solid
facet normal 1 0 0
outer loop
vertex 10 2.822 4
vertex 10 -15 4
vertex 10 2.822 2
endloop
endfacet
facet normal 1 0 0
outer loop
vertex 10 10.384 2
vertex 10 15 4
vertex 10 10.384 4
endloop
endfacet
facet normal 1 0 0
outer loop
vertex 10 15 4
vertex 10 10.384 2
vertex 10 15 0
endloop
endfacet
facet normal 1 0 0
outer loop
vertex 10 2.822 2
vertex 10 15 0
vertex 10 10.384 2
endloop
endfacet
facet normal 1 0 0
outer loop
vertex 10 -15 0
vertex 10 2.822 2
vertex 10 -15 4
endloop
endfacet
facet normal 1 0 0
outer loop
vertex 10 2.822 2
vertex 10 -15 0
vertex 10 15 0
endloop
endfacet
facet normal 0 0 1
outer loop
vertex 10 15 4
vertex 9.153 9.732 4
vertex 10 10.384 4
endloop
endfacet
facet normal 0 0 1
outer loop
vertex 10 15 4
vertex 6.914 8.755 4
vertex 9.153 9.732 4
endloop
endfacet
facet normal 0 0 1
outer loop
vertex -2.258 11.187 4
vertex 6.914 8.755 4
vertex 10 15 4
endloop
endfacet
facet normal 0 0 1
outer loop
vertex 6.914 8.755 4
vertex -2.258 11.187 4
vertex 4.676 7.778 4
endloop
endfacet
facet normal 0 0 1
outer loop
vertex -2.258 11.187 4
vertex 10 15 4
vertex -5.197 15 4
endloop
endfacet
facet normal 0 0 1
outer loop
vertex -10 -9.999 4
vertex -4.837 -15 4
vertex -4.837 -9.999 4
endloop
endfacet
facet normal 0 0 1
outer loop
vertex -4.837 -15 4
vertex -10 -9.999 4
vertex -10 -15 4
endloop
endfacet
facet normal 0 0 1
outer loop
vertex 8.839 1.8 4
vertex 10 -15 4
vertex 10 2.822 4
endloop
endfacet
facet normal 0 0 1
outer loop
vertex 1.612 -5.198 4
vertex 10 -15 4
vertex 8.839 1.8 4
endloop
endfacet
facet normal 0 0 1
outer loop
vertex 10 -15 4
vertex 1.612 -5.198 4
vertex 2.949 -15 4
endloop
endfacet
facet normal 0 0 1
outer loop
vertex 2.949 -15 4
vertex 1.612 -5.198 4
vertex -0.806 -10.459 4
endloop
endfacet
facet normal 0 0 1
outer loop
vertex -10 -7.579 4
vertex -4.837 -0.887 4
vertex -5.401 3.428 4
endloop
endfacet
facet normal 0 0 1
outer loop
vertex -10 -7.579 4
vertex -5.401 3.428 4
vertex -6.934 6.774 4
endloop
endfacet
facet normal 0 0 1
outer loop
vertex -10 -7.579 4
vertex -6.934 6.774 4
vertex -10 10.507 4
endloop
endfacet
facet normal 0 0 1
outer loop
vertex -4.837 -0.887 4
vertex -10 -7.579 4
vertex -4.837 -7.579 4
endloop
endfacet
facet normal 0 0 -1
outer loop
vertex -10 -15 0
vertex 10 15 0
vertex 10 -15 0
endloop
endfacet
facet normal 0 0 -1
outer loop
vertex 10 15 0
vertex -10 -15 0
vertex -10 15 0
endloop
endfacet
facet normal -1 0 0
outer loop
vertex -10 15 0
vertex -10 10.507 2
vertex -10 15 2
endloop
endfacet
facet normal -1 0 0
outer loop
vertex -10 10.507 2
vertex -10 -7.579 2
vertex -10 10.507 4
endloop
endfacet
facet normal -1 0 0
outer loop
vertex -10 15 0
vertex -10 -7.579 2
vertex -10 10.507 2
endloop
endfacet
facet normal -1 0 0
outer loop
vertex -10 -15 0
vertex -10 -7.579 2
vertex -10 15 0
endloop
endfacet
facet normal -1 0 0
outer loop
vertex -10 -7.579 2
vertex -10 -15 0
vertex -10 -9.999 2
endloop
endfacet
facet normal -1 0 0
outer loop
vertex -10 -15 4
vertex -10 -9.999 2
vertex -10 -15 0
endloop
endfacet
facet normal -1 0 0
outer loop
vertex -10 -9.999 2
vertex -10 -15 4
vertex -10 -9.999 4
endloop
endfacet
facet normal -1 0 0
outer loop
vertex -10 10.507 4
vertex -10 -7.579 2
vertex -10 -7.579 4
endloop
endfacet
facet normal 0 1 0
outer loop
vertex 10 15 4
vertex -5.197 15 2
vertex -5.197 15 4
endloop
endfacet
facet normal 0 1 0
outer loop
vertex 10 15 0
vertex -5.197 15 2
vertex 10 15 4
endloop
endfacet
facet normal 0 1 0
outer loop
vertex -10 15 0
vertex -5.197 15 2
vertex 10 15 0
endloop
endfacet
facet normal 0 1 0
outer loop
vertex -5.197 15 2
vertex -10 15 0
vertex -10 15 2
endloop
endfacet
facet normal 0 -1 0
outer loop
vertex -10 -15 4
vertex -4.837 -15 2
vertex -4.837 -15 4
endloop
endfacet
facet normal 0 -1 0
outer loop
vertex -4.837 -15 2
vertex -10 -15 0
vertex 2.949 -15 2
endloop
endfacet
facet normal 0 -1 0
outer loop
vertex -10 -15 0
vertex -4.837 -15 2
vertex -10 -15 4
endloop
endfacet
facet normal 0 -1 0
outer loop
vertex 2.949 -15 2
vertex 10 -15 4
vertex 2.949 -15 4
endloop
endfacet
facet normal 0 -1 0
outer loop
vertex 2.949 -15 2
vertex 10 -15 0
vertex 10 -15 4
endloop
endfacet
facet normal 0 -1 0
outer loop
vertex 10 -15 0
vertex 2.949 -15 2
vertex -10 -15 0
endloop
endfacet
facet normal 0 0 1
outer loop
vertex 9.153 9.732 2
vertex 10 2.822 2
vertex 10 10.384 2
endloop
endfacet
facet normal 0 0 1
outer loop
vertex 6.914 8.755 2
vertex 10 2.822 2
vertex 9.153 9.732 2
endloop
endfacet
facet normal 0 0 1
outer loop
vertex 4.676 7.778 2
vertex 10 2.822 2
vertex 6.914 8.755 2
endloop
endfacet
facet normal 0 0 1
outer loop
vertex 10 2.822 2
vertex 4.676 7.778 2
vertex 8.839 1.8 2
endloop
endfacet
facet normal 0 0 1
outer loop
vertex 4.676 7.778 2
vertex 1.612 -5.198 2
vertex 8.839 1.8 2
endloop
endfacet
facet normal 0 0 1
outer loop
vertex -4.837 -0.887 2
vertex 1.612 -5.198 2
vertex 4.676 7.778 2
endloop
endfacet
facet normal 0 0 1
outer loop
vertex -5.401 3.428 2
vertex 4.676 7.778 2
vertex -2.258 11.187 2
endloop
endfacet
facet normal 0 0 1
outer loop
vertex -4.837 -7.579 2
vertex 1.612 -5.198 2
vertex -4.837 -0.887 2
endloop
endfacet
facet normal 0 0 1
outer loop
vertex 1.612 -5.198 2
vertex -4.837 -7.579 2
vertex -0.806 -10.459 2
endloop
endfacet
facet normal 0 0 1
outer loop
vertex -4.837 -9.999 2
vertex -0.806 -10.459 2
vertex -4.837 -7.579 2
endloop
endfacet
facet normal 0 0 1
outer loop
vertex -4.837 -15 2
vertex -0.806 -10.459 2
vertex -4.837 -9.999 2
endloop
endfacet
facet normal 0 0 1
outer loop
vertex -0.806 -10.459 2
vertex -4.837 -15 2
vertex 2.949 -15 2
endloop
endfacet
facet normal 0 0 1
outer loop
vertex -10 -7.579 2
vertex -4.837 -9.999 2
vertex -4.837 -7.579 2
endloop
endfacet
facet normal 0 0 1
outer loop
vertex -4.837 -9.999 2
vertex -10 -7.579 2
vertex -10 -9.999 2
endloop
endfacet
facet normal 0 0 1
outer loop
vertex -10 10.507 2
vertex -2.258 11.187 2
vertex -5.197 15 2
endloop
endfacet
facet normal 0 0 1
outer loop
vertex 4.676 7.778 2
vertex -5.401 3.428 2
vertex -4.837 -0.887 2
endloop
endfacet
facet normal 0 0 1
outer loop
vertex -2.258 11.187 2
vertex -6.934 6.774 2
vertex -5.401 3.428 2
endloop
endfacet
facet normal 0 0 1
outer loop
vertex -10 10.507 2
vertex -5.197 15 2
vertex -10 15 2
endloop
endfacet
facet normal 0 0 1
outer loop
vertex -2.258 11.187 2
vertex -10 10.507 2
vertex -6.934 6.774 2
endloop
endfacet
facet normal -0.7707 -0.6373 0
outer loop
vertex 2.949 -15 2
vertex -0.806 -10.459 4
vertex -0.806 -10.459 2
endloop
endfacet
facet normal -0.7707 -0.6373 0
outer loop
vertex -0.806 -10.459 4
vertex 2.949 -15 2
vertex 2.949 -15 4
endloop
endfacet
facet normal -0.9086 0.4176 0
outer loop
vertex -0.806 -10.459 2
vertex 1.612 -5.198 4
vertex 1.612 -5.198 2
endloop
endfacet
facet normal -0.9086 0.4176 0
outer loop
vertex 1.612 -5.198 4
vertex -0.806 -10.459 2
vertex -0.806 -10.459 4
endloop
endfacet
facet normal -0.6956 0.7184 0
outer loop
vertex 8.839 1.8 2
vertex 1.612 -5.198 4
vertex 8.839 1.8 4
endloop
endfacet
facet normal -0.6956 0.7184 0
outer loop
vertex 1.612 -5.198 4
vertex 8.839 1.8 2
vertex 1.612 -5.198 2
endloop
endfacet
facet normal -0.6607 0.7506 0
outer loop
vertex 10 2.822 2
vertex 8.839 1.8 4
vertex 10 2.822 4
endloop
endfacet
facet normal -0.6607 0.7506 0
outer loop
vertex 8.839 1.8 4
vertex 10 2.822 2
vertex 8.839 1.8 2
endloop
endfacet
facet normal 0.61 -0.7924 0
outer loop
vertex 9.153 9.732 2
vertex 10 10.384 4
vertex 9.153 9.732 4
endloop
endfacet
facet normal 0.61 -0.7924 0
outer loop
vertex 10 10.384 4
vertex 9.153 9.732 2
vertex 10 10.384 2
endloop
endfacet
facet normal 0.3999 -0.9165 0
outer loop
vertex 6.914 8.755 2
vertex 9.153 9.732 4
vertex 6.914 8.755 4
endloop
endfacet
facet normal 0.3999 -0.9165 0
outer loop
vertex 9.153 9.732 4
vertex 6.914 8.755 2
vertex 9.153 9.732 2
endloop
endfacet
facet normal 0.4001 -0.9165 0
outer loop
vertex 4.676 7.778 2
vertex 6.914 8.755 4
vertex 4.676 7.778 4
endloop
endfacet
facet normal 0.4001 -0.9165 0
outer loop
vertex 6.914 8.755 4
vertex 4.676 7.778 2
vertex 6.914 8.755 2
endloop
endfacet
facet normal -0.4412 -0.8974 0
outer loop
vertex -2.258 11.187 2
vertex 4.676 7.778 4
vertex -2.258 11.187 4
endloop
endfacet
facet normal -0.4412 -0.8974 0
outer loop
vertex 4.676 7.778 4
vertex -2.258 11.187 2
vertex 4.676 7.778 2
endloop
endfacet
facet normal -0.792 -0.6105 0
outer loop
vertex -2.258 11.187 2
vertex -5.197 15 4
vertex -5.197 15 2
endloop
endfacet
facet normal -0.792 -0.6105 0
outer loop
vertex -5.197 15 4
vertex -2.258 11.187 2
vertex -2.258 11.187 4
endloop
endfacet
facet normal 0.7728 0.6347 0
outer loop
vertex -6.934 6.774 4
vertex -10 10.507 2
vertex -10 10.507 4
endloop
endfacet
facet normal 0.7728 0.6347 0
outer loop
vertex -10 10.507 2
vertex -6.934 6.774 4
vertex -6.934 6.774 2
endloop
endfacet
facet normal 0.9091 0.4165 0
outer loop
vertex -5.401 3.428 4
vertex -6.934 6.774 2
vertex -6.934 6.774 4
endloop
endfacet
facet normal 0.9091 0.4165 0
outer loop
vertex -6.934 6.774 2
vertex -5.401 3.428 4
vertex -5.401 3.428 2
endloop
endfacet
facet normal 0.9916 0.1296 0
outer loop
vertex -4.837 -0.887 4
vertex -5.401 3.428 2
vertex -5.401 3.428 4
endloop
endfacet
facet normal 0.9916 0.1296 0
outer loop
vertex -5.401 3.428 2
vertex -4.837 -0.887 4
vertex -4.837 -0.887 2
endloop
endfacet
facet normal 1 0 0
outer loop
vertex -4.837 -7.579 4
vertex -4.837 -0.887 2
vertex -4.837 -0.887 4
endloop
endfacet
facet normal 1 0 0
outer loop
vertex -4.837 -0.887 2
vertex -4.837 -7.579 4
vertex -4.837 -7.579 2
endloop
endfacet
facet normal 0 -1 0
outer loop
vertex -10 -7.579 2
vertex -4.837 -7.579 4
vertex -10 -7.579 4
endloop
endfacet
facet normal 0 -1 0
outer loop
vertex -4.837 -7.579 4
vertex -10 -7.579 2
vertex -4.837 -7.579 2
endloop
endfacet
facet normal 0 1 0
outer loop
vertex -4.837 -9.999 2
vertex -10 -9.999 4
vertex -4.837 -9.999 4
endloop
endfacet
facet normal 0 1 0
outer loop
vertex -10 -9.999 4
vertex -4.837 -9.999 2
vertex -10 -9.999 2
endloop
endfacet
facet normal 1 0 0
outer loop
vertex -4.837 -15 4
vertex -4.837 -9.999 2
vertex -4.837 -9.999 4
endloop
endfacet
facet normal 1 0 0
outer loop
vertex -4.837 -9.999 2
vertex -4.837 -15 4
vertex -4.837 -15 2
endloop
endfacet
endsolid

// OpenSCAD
difference() {
translate([0,0,2]) cube([20,30,4],center=true); 
translate([0,0,2]) scale(0.2) linear_extrude(height = 40) import("Amplifier3.dxf");}
